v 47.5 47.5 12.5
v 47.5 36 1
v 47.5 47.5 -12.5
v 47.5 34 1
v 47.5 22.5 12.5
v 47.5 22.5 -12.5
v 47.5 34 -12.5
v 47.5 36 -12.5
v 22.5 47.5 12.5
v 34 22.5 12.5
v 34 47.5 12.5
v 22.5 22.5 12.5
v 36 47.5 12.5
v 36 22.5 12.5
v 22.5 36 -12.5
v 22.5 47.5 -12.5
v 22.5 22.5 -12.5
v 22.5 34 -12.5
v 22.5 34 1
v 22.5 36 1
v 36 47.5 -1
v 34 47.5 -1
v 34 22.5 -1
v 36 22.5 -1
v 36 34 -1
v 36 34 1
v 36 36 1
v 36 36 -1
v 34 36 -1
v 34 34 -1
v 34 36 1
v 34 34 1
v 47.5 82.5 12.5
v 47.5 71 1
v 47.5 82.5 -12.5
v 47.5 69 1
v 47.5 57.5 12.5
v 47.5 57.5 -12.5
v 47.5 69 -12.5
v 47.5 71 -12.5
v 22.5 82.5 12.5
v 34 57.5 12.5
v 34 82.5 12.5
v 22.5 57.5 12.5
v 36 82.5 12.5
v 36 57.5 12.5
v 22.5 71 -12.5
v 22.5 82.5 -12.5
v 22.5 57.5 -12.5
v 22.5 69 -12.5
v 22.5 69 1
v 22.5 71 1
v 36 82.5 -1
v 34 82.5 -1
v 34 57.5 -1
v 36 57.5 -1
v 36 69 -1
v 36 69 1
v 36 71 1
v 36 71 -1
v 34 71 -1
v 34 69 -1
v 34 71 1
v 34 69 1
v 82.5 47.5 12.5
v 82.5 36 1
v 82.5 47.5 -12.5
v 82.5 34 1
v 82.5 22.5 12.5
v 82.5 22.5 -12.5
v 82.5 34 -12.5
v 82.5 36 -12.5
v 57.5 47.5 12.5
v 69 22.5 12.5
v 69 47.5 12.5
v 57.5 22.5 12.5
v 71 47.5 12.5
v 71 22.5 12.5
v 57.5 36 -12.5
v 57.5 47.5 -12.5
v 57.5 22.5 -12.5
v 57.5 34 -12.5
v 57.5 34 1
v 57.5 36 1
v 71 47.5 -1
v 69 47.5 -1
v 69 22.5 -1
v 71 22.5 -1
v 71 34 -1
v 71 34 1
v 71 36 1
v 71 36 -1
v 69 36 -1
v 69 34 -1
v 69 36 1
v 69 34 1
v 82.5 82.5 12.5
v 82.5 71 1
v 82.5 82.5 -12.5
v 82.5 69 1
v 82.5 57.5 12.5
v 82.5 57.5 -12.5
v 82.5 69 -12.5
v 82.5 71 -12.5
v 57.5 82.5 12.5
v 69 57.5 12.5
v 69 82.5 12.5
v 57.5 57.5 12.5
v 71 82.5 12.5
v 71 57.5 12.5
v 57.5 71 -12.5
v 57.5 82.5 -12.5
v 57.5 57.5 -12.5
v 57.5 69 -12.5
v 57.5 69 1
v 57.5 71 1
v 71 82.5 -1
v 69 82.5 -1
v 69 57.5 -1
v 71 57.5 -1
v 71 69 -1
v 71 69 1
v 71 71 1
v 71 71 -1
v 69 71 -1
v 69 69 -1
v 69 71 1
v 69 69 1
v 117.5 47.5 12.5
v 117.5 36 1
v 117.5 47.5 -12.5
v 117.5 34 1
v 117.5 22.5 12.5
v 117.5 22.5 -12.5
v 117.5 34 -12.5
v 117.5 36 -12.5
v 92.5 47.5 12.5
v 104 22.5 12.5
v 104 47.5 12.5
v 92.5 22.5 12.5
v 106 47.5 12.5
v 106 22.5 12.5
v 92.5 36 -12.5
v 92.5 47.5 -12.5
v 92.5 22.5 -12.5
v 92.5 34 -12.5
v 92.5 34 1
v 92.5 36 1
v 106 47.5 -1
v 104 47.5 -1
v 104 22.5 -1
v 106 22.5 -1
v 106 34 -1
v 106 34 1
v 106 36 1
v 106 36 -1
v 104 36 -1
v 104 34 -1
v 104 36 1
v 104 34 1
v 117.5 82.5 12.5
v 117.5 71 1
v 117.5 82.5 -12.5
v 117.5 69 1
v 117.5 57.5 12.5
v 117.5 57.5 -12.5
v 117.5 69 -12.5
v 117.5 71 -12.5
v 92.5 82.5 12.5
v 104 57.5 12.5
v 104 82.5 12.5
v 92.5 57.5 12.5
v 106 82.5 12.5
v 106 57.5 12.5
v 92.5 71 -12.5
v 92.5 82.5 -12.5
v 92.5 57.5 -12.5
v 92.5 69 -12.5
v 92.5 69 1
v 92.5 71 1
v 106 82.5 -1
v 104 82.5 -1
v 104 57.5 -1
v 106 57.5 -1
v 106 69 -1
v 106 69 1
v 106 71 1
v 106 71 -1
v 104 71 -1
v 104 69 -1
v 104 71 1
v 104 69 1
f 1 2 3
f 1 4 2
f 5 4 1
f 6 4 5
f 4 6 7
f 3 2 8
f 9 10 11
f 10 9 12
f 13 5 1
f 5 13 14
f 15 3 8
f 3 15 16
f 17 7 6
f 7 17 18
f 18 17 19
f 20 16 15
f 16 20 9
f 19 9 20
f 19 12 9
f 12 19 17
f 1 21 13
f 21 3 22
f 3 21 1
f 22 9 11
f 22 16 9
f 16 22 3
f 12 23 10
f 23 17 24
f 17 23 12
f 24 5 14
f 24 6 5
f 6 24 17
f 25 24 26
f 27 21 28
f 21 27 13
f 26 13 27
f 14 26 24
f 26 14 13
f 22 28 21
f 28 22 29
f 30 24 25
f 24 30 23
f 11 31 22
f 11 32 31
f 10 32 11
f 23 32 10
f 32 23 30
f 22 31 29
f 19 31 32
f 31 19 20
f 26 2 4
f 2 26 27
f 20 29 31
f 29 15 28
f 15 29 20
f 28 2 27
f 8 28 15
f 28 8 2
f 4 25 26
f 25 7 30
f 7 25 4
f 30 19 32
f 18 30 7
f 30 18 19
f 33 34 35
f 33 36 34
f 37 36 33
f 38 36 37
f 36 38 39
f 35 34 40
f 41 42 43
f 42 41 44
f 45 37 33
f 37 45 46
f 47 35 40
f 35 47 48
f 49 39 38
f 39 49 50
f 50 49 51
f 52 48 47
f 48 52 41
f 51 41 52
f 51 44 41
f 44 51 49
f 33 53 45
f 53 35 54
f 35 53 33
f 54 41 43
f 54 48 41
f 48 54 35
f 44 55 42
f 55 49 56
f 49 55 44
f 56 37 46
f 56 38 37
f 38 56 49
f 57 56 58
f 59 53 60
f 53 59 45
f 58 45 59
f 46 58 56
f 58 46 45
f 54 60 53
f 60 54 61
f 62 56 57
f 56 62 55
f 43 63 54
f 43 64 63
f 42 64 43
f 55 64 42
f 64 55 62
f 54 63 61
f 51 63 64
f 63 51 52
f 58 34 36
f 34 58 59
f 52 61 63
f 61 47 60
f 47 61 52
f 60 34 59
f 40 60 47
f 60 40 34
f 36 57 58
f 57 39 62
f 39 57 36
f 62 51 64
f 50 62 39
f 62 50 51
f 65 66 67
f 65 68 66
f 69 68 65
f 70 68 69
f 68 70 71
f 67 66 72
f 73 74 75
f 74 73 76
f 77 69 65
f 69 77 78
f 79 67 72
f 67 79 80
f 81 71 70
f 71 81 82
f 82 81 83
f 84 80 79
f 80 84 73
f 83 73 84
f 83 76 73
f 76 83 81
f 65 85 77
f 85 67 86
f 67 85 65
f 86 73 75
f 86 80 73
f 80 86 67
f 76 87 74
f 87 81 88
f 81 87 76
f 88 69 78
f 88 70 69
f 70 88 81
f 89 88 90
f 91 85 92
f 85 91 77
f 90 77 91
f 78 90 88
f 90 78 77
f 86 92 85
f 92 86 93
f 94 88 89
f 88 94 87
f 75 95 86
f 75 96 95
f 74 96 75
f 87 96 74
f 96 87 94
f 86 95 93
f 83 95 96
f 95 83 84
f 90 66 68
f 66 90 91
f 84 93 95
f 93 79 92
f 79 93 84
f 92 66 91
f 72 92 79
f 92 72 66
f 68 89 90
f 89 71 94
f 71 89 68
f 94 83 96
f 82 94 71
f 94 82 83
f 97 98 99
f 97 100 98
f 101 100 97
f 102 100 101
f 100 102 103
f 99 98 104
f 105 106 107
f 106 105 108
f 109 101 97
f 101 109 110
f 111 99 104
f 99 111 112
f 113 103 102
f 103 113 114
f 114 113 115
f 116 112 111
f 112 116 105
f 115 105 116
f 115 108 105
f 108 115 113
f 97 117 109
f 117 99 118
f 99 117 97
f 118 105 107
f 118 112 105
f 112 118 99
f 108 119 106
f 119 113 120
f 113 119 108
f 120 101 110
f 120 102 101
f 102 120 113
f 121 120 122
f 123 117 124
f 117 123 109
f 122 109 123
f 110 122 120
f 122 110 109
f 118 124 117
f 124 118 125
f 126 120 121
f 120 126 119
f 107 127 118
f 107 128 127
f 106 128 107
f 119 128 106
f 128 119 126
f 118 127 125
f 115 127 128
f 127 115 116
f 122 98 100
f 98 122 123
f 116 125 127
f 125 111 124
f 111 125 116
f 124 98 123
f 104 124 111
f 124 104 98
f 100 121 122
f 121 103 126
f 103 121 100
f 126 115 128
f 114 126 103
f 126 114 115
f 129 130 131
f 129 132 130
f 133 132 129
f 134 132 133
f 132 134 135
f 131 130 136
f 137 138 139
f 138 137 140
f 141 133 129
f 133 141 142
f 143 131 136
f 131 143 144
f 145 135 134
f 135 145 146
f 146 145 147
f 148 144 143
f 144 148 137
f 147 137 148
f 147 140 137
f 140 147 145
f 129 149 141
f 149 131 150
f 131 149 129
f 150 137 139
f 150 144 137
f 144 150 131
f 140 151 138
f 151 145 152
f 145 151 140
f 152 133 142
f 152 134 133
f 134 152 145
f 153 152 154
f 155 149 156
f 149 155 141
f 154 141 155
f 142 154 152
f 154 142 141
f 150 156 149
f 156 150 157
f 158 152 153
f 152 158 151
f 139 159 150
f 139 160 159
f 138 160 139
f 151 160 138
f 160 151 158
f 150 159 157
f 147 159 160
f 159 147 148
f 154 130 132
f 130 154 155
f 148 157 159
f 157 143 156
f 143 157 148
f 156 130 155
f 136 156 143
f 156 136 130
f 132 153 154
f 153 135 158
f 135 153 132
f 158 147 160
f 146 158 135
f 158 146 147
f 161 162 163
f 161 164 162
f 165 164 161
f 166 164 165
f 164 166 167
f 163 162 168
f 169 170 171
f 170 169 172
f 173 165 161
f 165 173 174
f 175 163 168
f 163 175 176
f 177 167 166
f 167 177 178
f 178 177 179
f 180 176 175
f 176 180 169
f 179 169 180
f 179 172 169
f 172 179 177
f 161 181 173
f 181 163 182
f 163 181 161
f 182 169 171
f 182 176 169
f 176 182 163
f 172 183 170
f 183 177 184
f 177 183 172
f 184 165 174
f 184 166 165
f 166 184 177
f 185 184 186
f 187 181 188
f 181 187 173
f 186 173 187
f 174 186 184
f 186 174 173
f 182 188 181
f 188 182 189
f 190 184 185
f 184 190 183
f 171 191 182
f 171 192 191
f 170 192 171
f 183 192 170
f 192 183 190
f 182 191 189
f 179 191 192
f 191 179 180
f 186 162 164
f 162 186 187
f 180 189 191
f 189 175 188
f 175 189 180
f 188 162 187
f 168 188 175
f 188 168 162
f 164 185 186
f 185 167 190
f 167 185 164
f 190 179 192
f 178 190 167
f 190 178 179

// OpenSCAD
// A 3D Toy

eps1 = 0.01;
eps2 = 2*eps1;

// Cube size.
cube_size = 25;

// Match this to elastic string's diameter.
slot_width = 2;

// Number of cube rows to print.
rows = 2;

// Number of cube columns to print
columns = 3;

// Space between cubes in the matrix. 
printing_space = 10;

pitch = cube_size + printing_space;

slot_depth = (cube_size + slot_width) / 2;

module sloted_cube() {
  difference() {
    cube([cube_size, cube_size, cube_size], center=true);

    translate([-slot_width/2, -cube_size/2 - eps1, -slot_width/2]) 
        cube([slot_width, cube_size+eps2, slot_depth+eps1]);

    translate([-cube_size/2 - eps1, -slot_width/2,  -cube_size/2-eps1]) 
        cube([cube_size+eps2, slot_width, slot_depth+eps1]);
  }
}


for (i = [1:columns]) {
  for (j = [1:rows]) {
    translate([i*pitch, j*pitch, 0]) sloted_cube();
  }
}
